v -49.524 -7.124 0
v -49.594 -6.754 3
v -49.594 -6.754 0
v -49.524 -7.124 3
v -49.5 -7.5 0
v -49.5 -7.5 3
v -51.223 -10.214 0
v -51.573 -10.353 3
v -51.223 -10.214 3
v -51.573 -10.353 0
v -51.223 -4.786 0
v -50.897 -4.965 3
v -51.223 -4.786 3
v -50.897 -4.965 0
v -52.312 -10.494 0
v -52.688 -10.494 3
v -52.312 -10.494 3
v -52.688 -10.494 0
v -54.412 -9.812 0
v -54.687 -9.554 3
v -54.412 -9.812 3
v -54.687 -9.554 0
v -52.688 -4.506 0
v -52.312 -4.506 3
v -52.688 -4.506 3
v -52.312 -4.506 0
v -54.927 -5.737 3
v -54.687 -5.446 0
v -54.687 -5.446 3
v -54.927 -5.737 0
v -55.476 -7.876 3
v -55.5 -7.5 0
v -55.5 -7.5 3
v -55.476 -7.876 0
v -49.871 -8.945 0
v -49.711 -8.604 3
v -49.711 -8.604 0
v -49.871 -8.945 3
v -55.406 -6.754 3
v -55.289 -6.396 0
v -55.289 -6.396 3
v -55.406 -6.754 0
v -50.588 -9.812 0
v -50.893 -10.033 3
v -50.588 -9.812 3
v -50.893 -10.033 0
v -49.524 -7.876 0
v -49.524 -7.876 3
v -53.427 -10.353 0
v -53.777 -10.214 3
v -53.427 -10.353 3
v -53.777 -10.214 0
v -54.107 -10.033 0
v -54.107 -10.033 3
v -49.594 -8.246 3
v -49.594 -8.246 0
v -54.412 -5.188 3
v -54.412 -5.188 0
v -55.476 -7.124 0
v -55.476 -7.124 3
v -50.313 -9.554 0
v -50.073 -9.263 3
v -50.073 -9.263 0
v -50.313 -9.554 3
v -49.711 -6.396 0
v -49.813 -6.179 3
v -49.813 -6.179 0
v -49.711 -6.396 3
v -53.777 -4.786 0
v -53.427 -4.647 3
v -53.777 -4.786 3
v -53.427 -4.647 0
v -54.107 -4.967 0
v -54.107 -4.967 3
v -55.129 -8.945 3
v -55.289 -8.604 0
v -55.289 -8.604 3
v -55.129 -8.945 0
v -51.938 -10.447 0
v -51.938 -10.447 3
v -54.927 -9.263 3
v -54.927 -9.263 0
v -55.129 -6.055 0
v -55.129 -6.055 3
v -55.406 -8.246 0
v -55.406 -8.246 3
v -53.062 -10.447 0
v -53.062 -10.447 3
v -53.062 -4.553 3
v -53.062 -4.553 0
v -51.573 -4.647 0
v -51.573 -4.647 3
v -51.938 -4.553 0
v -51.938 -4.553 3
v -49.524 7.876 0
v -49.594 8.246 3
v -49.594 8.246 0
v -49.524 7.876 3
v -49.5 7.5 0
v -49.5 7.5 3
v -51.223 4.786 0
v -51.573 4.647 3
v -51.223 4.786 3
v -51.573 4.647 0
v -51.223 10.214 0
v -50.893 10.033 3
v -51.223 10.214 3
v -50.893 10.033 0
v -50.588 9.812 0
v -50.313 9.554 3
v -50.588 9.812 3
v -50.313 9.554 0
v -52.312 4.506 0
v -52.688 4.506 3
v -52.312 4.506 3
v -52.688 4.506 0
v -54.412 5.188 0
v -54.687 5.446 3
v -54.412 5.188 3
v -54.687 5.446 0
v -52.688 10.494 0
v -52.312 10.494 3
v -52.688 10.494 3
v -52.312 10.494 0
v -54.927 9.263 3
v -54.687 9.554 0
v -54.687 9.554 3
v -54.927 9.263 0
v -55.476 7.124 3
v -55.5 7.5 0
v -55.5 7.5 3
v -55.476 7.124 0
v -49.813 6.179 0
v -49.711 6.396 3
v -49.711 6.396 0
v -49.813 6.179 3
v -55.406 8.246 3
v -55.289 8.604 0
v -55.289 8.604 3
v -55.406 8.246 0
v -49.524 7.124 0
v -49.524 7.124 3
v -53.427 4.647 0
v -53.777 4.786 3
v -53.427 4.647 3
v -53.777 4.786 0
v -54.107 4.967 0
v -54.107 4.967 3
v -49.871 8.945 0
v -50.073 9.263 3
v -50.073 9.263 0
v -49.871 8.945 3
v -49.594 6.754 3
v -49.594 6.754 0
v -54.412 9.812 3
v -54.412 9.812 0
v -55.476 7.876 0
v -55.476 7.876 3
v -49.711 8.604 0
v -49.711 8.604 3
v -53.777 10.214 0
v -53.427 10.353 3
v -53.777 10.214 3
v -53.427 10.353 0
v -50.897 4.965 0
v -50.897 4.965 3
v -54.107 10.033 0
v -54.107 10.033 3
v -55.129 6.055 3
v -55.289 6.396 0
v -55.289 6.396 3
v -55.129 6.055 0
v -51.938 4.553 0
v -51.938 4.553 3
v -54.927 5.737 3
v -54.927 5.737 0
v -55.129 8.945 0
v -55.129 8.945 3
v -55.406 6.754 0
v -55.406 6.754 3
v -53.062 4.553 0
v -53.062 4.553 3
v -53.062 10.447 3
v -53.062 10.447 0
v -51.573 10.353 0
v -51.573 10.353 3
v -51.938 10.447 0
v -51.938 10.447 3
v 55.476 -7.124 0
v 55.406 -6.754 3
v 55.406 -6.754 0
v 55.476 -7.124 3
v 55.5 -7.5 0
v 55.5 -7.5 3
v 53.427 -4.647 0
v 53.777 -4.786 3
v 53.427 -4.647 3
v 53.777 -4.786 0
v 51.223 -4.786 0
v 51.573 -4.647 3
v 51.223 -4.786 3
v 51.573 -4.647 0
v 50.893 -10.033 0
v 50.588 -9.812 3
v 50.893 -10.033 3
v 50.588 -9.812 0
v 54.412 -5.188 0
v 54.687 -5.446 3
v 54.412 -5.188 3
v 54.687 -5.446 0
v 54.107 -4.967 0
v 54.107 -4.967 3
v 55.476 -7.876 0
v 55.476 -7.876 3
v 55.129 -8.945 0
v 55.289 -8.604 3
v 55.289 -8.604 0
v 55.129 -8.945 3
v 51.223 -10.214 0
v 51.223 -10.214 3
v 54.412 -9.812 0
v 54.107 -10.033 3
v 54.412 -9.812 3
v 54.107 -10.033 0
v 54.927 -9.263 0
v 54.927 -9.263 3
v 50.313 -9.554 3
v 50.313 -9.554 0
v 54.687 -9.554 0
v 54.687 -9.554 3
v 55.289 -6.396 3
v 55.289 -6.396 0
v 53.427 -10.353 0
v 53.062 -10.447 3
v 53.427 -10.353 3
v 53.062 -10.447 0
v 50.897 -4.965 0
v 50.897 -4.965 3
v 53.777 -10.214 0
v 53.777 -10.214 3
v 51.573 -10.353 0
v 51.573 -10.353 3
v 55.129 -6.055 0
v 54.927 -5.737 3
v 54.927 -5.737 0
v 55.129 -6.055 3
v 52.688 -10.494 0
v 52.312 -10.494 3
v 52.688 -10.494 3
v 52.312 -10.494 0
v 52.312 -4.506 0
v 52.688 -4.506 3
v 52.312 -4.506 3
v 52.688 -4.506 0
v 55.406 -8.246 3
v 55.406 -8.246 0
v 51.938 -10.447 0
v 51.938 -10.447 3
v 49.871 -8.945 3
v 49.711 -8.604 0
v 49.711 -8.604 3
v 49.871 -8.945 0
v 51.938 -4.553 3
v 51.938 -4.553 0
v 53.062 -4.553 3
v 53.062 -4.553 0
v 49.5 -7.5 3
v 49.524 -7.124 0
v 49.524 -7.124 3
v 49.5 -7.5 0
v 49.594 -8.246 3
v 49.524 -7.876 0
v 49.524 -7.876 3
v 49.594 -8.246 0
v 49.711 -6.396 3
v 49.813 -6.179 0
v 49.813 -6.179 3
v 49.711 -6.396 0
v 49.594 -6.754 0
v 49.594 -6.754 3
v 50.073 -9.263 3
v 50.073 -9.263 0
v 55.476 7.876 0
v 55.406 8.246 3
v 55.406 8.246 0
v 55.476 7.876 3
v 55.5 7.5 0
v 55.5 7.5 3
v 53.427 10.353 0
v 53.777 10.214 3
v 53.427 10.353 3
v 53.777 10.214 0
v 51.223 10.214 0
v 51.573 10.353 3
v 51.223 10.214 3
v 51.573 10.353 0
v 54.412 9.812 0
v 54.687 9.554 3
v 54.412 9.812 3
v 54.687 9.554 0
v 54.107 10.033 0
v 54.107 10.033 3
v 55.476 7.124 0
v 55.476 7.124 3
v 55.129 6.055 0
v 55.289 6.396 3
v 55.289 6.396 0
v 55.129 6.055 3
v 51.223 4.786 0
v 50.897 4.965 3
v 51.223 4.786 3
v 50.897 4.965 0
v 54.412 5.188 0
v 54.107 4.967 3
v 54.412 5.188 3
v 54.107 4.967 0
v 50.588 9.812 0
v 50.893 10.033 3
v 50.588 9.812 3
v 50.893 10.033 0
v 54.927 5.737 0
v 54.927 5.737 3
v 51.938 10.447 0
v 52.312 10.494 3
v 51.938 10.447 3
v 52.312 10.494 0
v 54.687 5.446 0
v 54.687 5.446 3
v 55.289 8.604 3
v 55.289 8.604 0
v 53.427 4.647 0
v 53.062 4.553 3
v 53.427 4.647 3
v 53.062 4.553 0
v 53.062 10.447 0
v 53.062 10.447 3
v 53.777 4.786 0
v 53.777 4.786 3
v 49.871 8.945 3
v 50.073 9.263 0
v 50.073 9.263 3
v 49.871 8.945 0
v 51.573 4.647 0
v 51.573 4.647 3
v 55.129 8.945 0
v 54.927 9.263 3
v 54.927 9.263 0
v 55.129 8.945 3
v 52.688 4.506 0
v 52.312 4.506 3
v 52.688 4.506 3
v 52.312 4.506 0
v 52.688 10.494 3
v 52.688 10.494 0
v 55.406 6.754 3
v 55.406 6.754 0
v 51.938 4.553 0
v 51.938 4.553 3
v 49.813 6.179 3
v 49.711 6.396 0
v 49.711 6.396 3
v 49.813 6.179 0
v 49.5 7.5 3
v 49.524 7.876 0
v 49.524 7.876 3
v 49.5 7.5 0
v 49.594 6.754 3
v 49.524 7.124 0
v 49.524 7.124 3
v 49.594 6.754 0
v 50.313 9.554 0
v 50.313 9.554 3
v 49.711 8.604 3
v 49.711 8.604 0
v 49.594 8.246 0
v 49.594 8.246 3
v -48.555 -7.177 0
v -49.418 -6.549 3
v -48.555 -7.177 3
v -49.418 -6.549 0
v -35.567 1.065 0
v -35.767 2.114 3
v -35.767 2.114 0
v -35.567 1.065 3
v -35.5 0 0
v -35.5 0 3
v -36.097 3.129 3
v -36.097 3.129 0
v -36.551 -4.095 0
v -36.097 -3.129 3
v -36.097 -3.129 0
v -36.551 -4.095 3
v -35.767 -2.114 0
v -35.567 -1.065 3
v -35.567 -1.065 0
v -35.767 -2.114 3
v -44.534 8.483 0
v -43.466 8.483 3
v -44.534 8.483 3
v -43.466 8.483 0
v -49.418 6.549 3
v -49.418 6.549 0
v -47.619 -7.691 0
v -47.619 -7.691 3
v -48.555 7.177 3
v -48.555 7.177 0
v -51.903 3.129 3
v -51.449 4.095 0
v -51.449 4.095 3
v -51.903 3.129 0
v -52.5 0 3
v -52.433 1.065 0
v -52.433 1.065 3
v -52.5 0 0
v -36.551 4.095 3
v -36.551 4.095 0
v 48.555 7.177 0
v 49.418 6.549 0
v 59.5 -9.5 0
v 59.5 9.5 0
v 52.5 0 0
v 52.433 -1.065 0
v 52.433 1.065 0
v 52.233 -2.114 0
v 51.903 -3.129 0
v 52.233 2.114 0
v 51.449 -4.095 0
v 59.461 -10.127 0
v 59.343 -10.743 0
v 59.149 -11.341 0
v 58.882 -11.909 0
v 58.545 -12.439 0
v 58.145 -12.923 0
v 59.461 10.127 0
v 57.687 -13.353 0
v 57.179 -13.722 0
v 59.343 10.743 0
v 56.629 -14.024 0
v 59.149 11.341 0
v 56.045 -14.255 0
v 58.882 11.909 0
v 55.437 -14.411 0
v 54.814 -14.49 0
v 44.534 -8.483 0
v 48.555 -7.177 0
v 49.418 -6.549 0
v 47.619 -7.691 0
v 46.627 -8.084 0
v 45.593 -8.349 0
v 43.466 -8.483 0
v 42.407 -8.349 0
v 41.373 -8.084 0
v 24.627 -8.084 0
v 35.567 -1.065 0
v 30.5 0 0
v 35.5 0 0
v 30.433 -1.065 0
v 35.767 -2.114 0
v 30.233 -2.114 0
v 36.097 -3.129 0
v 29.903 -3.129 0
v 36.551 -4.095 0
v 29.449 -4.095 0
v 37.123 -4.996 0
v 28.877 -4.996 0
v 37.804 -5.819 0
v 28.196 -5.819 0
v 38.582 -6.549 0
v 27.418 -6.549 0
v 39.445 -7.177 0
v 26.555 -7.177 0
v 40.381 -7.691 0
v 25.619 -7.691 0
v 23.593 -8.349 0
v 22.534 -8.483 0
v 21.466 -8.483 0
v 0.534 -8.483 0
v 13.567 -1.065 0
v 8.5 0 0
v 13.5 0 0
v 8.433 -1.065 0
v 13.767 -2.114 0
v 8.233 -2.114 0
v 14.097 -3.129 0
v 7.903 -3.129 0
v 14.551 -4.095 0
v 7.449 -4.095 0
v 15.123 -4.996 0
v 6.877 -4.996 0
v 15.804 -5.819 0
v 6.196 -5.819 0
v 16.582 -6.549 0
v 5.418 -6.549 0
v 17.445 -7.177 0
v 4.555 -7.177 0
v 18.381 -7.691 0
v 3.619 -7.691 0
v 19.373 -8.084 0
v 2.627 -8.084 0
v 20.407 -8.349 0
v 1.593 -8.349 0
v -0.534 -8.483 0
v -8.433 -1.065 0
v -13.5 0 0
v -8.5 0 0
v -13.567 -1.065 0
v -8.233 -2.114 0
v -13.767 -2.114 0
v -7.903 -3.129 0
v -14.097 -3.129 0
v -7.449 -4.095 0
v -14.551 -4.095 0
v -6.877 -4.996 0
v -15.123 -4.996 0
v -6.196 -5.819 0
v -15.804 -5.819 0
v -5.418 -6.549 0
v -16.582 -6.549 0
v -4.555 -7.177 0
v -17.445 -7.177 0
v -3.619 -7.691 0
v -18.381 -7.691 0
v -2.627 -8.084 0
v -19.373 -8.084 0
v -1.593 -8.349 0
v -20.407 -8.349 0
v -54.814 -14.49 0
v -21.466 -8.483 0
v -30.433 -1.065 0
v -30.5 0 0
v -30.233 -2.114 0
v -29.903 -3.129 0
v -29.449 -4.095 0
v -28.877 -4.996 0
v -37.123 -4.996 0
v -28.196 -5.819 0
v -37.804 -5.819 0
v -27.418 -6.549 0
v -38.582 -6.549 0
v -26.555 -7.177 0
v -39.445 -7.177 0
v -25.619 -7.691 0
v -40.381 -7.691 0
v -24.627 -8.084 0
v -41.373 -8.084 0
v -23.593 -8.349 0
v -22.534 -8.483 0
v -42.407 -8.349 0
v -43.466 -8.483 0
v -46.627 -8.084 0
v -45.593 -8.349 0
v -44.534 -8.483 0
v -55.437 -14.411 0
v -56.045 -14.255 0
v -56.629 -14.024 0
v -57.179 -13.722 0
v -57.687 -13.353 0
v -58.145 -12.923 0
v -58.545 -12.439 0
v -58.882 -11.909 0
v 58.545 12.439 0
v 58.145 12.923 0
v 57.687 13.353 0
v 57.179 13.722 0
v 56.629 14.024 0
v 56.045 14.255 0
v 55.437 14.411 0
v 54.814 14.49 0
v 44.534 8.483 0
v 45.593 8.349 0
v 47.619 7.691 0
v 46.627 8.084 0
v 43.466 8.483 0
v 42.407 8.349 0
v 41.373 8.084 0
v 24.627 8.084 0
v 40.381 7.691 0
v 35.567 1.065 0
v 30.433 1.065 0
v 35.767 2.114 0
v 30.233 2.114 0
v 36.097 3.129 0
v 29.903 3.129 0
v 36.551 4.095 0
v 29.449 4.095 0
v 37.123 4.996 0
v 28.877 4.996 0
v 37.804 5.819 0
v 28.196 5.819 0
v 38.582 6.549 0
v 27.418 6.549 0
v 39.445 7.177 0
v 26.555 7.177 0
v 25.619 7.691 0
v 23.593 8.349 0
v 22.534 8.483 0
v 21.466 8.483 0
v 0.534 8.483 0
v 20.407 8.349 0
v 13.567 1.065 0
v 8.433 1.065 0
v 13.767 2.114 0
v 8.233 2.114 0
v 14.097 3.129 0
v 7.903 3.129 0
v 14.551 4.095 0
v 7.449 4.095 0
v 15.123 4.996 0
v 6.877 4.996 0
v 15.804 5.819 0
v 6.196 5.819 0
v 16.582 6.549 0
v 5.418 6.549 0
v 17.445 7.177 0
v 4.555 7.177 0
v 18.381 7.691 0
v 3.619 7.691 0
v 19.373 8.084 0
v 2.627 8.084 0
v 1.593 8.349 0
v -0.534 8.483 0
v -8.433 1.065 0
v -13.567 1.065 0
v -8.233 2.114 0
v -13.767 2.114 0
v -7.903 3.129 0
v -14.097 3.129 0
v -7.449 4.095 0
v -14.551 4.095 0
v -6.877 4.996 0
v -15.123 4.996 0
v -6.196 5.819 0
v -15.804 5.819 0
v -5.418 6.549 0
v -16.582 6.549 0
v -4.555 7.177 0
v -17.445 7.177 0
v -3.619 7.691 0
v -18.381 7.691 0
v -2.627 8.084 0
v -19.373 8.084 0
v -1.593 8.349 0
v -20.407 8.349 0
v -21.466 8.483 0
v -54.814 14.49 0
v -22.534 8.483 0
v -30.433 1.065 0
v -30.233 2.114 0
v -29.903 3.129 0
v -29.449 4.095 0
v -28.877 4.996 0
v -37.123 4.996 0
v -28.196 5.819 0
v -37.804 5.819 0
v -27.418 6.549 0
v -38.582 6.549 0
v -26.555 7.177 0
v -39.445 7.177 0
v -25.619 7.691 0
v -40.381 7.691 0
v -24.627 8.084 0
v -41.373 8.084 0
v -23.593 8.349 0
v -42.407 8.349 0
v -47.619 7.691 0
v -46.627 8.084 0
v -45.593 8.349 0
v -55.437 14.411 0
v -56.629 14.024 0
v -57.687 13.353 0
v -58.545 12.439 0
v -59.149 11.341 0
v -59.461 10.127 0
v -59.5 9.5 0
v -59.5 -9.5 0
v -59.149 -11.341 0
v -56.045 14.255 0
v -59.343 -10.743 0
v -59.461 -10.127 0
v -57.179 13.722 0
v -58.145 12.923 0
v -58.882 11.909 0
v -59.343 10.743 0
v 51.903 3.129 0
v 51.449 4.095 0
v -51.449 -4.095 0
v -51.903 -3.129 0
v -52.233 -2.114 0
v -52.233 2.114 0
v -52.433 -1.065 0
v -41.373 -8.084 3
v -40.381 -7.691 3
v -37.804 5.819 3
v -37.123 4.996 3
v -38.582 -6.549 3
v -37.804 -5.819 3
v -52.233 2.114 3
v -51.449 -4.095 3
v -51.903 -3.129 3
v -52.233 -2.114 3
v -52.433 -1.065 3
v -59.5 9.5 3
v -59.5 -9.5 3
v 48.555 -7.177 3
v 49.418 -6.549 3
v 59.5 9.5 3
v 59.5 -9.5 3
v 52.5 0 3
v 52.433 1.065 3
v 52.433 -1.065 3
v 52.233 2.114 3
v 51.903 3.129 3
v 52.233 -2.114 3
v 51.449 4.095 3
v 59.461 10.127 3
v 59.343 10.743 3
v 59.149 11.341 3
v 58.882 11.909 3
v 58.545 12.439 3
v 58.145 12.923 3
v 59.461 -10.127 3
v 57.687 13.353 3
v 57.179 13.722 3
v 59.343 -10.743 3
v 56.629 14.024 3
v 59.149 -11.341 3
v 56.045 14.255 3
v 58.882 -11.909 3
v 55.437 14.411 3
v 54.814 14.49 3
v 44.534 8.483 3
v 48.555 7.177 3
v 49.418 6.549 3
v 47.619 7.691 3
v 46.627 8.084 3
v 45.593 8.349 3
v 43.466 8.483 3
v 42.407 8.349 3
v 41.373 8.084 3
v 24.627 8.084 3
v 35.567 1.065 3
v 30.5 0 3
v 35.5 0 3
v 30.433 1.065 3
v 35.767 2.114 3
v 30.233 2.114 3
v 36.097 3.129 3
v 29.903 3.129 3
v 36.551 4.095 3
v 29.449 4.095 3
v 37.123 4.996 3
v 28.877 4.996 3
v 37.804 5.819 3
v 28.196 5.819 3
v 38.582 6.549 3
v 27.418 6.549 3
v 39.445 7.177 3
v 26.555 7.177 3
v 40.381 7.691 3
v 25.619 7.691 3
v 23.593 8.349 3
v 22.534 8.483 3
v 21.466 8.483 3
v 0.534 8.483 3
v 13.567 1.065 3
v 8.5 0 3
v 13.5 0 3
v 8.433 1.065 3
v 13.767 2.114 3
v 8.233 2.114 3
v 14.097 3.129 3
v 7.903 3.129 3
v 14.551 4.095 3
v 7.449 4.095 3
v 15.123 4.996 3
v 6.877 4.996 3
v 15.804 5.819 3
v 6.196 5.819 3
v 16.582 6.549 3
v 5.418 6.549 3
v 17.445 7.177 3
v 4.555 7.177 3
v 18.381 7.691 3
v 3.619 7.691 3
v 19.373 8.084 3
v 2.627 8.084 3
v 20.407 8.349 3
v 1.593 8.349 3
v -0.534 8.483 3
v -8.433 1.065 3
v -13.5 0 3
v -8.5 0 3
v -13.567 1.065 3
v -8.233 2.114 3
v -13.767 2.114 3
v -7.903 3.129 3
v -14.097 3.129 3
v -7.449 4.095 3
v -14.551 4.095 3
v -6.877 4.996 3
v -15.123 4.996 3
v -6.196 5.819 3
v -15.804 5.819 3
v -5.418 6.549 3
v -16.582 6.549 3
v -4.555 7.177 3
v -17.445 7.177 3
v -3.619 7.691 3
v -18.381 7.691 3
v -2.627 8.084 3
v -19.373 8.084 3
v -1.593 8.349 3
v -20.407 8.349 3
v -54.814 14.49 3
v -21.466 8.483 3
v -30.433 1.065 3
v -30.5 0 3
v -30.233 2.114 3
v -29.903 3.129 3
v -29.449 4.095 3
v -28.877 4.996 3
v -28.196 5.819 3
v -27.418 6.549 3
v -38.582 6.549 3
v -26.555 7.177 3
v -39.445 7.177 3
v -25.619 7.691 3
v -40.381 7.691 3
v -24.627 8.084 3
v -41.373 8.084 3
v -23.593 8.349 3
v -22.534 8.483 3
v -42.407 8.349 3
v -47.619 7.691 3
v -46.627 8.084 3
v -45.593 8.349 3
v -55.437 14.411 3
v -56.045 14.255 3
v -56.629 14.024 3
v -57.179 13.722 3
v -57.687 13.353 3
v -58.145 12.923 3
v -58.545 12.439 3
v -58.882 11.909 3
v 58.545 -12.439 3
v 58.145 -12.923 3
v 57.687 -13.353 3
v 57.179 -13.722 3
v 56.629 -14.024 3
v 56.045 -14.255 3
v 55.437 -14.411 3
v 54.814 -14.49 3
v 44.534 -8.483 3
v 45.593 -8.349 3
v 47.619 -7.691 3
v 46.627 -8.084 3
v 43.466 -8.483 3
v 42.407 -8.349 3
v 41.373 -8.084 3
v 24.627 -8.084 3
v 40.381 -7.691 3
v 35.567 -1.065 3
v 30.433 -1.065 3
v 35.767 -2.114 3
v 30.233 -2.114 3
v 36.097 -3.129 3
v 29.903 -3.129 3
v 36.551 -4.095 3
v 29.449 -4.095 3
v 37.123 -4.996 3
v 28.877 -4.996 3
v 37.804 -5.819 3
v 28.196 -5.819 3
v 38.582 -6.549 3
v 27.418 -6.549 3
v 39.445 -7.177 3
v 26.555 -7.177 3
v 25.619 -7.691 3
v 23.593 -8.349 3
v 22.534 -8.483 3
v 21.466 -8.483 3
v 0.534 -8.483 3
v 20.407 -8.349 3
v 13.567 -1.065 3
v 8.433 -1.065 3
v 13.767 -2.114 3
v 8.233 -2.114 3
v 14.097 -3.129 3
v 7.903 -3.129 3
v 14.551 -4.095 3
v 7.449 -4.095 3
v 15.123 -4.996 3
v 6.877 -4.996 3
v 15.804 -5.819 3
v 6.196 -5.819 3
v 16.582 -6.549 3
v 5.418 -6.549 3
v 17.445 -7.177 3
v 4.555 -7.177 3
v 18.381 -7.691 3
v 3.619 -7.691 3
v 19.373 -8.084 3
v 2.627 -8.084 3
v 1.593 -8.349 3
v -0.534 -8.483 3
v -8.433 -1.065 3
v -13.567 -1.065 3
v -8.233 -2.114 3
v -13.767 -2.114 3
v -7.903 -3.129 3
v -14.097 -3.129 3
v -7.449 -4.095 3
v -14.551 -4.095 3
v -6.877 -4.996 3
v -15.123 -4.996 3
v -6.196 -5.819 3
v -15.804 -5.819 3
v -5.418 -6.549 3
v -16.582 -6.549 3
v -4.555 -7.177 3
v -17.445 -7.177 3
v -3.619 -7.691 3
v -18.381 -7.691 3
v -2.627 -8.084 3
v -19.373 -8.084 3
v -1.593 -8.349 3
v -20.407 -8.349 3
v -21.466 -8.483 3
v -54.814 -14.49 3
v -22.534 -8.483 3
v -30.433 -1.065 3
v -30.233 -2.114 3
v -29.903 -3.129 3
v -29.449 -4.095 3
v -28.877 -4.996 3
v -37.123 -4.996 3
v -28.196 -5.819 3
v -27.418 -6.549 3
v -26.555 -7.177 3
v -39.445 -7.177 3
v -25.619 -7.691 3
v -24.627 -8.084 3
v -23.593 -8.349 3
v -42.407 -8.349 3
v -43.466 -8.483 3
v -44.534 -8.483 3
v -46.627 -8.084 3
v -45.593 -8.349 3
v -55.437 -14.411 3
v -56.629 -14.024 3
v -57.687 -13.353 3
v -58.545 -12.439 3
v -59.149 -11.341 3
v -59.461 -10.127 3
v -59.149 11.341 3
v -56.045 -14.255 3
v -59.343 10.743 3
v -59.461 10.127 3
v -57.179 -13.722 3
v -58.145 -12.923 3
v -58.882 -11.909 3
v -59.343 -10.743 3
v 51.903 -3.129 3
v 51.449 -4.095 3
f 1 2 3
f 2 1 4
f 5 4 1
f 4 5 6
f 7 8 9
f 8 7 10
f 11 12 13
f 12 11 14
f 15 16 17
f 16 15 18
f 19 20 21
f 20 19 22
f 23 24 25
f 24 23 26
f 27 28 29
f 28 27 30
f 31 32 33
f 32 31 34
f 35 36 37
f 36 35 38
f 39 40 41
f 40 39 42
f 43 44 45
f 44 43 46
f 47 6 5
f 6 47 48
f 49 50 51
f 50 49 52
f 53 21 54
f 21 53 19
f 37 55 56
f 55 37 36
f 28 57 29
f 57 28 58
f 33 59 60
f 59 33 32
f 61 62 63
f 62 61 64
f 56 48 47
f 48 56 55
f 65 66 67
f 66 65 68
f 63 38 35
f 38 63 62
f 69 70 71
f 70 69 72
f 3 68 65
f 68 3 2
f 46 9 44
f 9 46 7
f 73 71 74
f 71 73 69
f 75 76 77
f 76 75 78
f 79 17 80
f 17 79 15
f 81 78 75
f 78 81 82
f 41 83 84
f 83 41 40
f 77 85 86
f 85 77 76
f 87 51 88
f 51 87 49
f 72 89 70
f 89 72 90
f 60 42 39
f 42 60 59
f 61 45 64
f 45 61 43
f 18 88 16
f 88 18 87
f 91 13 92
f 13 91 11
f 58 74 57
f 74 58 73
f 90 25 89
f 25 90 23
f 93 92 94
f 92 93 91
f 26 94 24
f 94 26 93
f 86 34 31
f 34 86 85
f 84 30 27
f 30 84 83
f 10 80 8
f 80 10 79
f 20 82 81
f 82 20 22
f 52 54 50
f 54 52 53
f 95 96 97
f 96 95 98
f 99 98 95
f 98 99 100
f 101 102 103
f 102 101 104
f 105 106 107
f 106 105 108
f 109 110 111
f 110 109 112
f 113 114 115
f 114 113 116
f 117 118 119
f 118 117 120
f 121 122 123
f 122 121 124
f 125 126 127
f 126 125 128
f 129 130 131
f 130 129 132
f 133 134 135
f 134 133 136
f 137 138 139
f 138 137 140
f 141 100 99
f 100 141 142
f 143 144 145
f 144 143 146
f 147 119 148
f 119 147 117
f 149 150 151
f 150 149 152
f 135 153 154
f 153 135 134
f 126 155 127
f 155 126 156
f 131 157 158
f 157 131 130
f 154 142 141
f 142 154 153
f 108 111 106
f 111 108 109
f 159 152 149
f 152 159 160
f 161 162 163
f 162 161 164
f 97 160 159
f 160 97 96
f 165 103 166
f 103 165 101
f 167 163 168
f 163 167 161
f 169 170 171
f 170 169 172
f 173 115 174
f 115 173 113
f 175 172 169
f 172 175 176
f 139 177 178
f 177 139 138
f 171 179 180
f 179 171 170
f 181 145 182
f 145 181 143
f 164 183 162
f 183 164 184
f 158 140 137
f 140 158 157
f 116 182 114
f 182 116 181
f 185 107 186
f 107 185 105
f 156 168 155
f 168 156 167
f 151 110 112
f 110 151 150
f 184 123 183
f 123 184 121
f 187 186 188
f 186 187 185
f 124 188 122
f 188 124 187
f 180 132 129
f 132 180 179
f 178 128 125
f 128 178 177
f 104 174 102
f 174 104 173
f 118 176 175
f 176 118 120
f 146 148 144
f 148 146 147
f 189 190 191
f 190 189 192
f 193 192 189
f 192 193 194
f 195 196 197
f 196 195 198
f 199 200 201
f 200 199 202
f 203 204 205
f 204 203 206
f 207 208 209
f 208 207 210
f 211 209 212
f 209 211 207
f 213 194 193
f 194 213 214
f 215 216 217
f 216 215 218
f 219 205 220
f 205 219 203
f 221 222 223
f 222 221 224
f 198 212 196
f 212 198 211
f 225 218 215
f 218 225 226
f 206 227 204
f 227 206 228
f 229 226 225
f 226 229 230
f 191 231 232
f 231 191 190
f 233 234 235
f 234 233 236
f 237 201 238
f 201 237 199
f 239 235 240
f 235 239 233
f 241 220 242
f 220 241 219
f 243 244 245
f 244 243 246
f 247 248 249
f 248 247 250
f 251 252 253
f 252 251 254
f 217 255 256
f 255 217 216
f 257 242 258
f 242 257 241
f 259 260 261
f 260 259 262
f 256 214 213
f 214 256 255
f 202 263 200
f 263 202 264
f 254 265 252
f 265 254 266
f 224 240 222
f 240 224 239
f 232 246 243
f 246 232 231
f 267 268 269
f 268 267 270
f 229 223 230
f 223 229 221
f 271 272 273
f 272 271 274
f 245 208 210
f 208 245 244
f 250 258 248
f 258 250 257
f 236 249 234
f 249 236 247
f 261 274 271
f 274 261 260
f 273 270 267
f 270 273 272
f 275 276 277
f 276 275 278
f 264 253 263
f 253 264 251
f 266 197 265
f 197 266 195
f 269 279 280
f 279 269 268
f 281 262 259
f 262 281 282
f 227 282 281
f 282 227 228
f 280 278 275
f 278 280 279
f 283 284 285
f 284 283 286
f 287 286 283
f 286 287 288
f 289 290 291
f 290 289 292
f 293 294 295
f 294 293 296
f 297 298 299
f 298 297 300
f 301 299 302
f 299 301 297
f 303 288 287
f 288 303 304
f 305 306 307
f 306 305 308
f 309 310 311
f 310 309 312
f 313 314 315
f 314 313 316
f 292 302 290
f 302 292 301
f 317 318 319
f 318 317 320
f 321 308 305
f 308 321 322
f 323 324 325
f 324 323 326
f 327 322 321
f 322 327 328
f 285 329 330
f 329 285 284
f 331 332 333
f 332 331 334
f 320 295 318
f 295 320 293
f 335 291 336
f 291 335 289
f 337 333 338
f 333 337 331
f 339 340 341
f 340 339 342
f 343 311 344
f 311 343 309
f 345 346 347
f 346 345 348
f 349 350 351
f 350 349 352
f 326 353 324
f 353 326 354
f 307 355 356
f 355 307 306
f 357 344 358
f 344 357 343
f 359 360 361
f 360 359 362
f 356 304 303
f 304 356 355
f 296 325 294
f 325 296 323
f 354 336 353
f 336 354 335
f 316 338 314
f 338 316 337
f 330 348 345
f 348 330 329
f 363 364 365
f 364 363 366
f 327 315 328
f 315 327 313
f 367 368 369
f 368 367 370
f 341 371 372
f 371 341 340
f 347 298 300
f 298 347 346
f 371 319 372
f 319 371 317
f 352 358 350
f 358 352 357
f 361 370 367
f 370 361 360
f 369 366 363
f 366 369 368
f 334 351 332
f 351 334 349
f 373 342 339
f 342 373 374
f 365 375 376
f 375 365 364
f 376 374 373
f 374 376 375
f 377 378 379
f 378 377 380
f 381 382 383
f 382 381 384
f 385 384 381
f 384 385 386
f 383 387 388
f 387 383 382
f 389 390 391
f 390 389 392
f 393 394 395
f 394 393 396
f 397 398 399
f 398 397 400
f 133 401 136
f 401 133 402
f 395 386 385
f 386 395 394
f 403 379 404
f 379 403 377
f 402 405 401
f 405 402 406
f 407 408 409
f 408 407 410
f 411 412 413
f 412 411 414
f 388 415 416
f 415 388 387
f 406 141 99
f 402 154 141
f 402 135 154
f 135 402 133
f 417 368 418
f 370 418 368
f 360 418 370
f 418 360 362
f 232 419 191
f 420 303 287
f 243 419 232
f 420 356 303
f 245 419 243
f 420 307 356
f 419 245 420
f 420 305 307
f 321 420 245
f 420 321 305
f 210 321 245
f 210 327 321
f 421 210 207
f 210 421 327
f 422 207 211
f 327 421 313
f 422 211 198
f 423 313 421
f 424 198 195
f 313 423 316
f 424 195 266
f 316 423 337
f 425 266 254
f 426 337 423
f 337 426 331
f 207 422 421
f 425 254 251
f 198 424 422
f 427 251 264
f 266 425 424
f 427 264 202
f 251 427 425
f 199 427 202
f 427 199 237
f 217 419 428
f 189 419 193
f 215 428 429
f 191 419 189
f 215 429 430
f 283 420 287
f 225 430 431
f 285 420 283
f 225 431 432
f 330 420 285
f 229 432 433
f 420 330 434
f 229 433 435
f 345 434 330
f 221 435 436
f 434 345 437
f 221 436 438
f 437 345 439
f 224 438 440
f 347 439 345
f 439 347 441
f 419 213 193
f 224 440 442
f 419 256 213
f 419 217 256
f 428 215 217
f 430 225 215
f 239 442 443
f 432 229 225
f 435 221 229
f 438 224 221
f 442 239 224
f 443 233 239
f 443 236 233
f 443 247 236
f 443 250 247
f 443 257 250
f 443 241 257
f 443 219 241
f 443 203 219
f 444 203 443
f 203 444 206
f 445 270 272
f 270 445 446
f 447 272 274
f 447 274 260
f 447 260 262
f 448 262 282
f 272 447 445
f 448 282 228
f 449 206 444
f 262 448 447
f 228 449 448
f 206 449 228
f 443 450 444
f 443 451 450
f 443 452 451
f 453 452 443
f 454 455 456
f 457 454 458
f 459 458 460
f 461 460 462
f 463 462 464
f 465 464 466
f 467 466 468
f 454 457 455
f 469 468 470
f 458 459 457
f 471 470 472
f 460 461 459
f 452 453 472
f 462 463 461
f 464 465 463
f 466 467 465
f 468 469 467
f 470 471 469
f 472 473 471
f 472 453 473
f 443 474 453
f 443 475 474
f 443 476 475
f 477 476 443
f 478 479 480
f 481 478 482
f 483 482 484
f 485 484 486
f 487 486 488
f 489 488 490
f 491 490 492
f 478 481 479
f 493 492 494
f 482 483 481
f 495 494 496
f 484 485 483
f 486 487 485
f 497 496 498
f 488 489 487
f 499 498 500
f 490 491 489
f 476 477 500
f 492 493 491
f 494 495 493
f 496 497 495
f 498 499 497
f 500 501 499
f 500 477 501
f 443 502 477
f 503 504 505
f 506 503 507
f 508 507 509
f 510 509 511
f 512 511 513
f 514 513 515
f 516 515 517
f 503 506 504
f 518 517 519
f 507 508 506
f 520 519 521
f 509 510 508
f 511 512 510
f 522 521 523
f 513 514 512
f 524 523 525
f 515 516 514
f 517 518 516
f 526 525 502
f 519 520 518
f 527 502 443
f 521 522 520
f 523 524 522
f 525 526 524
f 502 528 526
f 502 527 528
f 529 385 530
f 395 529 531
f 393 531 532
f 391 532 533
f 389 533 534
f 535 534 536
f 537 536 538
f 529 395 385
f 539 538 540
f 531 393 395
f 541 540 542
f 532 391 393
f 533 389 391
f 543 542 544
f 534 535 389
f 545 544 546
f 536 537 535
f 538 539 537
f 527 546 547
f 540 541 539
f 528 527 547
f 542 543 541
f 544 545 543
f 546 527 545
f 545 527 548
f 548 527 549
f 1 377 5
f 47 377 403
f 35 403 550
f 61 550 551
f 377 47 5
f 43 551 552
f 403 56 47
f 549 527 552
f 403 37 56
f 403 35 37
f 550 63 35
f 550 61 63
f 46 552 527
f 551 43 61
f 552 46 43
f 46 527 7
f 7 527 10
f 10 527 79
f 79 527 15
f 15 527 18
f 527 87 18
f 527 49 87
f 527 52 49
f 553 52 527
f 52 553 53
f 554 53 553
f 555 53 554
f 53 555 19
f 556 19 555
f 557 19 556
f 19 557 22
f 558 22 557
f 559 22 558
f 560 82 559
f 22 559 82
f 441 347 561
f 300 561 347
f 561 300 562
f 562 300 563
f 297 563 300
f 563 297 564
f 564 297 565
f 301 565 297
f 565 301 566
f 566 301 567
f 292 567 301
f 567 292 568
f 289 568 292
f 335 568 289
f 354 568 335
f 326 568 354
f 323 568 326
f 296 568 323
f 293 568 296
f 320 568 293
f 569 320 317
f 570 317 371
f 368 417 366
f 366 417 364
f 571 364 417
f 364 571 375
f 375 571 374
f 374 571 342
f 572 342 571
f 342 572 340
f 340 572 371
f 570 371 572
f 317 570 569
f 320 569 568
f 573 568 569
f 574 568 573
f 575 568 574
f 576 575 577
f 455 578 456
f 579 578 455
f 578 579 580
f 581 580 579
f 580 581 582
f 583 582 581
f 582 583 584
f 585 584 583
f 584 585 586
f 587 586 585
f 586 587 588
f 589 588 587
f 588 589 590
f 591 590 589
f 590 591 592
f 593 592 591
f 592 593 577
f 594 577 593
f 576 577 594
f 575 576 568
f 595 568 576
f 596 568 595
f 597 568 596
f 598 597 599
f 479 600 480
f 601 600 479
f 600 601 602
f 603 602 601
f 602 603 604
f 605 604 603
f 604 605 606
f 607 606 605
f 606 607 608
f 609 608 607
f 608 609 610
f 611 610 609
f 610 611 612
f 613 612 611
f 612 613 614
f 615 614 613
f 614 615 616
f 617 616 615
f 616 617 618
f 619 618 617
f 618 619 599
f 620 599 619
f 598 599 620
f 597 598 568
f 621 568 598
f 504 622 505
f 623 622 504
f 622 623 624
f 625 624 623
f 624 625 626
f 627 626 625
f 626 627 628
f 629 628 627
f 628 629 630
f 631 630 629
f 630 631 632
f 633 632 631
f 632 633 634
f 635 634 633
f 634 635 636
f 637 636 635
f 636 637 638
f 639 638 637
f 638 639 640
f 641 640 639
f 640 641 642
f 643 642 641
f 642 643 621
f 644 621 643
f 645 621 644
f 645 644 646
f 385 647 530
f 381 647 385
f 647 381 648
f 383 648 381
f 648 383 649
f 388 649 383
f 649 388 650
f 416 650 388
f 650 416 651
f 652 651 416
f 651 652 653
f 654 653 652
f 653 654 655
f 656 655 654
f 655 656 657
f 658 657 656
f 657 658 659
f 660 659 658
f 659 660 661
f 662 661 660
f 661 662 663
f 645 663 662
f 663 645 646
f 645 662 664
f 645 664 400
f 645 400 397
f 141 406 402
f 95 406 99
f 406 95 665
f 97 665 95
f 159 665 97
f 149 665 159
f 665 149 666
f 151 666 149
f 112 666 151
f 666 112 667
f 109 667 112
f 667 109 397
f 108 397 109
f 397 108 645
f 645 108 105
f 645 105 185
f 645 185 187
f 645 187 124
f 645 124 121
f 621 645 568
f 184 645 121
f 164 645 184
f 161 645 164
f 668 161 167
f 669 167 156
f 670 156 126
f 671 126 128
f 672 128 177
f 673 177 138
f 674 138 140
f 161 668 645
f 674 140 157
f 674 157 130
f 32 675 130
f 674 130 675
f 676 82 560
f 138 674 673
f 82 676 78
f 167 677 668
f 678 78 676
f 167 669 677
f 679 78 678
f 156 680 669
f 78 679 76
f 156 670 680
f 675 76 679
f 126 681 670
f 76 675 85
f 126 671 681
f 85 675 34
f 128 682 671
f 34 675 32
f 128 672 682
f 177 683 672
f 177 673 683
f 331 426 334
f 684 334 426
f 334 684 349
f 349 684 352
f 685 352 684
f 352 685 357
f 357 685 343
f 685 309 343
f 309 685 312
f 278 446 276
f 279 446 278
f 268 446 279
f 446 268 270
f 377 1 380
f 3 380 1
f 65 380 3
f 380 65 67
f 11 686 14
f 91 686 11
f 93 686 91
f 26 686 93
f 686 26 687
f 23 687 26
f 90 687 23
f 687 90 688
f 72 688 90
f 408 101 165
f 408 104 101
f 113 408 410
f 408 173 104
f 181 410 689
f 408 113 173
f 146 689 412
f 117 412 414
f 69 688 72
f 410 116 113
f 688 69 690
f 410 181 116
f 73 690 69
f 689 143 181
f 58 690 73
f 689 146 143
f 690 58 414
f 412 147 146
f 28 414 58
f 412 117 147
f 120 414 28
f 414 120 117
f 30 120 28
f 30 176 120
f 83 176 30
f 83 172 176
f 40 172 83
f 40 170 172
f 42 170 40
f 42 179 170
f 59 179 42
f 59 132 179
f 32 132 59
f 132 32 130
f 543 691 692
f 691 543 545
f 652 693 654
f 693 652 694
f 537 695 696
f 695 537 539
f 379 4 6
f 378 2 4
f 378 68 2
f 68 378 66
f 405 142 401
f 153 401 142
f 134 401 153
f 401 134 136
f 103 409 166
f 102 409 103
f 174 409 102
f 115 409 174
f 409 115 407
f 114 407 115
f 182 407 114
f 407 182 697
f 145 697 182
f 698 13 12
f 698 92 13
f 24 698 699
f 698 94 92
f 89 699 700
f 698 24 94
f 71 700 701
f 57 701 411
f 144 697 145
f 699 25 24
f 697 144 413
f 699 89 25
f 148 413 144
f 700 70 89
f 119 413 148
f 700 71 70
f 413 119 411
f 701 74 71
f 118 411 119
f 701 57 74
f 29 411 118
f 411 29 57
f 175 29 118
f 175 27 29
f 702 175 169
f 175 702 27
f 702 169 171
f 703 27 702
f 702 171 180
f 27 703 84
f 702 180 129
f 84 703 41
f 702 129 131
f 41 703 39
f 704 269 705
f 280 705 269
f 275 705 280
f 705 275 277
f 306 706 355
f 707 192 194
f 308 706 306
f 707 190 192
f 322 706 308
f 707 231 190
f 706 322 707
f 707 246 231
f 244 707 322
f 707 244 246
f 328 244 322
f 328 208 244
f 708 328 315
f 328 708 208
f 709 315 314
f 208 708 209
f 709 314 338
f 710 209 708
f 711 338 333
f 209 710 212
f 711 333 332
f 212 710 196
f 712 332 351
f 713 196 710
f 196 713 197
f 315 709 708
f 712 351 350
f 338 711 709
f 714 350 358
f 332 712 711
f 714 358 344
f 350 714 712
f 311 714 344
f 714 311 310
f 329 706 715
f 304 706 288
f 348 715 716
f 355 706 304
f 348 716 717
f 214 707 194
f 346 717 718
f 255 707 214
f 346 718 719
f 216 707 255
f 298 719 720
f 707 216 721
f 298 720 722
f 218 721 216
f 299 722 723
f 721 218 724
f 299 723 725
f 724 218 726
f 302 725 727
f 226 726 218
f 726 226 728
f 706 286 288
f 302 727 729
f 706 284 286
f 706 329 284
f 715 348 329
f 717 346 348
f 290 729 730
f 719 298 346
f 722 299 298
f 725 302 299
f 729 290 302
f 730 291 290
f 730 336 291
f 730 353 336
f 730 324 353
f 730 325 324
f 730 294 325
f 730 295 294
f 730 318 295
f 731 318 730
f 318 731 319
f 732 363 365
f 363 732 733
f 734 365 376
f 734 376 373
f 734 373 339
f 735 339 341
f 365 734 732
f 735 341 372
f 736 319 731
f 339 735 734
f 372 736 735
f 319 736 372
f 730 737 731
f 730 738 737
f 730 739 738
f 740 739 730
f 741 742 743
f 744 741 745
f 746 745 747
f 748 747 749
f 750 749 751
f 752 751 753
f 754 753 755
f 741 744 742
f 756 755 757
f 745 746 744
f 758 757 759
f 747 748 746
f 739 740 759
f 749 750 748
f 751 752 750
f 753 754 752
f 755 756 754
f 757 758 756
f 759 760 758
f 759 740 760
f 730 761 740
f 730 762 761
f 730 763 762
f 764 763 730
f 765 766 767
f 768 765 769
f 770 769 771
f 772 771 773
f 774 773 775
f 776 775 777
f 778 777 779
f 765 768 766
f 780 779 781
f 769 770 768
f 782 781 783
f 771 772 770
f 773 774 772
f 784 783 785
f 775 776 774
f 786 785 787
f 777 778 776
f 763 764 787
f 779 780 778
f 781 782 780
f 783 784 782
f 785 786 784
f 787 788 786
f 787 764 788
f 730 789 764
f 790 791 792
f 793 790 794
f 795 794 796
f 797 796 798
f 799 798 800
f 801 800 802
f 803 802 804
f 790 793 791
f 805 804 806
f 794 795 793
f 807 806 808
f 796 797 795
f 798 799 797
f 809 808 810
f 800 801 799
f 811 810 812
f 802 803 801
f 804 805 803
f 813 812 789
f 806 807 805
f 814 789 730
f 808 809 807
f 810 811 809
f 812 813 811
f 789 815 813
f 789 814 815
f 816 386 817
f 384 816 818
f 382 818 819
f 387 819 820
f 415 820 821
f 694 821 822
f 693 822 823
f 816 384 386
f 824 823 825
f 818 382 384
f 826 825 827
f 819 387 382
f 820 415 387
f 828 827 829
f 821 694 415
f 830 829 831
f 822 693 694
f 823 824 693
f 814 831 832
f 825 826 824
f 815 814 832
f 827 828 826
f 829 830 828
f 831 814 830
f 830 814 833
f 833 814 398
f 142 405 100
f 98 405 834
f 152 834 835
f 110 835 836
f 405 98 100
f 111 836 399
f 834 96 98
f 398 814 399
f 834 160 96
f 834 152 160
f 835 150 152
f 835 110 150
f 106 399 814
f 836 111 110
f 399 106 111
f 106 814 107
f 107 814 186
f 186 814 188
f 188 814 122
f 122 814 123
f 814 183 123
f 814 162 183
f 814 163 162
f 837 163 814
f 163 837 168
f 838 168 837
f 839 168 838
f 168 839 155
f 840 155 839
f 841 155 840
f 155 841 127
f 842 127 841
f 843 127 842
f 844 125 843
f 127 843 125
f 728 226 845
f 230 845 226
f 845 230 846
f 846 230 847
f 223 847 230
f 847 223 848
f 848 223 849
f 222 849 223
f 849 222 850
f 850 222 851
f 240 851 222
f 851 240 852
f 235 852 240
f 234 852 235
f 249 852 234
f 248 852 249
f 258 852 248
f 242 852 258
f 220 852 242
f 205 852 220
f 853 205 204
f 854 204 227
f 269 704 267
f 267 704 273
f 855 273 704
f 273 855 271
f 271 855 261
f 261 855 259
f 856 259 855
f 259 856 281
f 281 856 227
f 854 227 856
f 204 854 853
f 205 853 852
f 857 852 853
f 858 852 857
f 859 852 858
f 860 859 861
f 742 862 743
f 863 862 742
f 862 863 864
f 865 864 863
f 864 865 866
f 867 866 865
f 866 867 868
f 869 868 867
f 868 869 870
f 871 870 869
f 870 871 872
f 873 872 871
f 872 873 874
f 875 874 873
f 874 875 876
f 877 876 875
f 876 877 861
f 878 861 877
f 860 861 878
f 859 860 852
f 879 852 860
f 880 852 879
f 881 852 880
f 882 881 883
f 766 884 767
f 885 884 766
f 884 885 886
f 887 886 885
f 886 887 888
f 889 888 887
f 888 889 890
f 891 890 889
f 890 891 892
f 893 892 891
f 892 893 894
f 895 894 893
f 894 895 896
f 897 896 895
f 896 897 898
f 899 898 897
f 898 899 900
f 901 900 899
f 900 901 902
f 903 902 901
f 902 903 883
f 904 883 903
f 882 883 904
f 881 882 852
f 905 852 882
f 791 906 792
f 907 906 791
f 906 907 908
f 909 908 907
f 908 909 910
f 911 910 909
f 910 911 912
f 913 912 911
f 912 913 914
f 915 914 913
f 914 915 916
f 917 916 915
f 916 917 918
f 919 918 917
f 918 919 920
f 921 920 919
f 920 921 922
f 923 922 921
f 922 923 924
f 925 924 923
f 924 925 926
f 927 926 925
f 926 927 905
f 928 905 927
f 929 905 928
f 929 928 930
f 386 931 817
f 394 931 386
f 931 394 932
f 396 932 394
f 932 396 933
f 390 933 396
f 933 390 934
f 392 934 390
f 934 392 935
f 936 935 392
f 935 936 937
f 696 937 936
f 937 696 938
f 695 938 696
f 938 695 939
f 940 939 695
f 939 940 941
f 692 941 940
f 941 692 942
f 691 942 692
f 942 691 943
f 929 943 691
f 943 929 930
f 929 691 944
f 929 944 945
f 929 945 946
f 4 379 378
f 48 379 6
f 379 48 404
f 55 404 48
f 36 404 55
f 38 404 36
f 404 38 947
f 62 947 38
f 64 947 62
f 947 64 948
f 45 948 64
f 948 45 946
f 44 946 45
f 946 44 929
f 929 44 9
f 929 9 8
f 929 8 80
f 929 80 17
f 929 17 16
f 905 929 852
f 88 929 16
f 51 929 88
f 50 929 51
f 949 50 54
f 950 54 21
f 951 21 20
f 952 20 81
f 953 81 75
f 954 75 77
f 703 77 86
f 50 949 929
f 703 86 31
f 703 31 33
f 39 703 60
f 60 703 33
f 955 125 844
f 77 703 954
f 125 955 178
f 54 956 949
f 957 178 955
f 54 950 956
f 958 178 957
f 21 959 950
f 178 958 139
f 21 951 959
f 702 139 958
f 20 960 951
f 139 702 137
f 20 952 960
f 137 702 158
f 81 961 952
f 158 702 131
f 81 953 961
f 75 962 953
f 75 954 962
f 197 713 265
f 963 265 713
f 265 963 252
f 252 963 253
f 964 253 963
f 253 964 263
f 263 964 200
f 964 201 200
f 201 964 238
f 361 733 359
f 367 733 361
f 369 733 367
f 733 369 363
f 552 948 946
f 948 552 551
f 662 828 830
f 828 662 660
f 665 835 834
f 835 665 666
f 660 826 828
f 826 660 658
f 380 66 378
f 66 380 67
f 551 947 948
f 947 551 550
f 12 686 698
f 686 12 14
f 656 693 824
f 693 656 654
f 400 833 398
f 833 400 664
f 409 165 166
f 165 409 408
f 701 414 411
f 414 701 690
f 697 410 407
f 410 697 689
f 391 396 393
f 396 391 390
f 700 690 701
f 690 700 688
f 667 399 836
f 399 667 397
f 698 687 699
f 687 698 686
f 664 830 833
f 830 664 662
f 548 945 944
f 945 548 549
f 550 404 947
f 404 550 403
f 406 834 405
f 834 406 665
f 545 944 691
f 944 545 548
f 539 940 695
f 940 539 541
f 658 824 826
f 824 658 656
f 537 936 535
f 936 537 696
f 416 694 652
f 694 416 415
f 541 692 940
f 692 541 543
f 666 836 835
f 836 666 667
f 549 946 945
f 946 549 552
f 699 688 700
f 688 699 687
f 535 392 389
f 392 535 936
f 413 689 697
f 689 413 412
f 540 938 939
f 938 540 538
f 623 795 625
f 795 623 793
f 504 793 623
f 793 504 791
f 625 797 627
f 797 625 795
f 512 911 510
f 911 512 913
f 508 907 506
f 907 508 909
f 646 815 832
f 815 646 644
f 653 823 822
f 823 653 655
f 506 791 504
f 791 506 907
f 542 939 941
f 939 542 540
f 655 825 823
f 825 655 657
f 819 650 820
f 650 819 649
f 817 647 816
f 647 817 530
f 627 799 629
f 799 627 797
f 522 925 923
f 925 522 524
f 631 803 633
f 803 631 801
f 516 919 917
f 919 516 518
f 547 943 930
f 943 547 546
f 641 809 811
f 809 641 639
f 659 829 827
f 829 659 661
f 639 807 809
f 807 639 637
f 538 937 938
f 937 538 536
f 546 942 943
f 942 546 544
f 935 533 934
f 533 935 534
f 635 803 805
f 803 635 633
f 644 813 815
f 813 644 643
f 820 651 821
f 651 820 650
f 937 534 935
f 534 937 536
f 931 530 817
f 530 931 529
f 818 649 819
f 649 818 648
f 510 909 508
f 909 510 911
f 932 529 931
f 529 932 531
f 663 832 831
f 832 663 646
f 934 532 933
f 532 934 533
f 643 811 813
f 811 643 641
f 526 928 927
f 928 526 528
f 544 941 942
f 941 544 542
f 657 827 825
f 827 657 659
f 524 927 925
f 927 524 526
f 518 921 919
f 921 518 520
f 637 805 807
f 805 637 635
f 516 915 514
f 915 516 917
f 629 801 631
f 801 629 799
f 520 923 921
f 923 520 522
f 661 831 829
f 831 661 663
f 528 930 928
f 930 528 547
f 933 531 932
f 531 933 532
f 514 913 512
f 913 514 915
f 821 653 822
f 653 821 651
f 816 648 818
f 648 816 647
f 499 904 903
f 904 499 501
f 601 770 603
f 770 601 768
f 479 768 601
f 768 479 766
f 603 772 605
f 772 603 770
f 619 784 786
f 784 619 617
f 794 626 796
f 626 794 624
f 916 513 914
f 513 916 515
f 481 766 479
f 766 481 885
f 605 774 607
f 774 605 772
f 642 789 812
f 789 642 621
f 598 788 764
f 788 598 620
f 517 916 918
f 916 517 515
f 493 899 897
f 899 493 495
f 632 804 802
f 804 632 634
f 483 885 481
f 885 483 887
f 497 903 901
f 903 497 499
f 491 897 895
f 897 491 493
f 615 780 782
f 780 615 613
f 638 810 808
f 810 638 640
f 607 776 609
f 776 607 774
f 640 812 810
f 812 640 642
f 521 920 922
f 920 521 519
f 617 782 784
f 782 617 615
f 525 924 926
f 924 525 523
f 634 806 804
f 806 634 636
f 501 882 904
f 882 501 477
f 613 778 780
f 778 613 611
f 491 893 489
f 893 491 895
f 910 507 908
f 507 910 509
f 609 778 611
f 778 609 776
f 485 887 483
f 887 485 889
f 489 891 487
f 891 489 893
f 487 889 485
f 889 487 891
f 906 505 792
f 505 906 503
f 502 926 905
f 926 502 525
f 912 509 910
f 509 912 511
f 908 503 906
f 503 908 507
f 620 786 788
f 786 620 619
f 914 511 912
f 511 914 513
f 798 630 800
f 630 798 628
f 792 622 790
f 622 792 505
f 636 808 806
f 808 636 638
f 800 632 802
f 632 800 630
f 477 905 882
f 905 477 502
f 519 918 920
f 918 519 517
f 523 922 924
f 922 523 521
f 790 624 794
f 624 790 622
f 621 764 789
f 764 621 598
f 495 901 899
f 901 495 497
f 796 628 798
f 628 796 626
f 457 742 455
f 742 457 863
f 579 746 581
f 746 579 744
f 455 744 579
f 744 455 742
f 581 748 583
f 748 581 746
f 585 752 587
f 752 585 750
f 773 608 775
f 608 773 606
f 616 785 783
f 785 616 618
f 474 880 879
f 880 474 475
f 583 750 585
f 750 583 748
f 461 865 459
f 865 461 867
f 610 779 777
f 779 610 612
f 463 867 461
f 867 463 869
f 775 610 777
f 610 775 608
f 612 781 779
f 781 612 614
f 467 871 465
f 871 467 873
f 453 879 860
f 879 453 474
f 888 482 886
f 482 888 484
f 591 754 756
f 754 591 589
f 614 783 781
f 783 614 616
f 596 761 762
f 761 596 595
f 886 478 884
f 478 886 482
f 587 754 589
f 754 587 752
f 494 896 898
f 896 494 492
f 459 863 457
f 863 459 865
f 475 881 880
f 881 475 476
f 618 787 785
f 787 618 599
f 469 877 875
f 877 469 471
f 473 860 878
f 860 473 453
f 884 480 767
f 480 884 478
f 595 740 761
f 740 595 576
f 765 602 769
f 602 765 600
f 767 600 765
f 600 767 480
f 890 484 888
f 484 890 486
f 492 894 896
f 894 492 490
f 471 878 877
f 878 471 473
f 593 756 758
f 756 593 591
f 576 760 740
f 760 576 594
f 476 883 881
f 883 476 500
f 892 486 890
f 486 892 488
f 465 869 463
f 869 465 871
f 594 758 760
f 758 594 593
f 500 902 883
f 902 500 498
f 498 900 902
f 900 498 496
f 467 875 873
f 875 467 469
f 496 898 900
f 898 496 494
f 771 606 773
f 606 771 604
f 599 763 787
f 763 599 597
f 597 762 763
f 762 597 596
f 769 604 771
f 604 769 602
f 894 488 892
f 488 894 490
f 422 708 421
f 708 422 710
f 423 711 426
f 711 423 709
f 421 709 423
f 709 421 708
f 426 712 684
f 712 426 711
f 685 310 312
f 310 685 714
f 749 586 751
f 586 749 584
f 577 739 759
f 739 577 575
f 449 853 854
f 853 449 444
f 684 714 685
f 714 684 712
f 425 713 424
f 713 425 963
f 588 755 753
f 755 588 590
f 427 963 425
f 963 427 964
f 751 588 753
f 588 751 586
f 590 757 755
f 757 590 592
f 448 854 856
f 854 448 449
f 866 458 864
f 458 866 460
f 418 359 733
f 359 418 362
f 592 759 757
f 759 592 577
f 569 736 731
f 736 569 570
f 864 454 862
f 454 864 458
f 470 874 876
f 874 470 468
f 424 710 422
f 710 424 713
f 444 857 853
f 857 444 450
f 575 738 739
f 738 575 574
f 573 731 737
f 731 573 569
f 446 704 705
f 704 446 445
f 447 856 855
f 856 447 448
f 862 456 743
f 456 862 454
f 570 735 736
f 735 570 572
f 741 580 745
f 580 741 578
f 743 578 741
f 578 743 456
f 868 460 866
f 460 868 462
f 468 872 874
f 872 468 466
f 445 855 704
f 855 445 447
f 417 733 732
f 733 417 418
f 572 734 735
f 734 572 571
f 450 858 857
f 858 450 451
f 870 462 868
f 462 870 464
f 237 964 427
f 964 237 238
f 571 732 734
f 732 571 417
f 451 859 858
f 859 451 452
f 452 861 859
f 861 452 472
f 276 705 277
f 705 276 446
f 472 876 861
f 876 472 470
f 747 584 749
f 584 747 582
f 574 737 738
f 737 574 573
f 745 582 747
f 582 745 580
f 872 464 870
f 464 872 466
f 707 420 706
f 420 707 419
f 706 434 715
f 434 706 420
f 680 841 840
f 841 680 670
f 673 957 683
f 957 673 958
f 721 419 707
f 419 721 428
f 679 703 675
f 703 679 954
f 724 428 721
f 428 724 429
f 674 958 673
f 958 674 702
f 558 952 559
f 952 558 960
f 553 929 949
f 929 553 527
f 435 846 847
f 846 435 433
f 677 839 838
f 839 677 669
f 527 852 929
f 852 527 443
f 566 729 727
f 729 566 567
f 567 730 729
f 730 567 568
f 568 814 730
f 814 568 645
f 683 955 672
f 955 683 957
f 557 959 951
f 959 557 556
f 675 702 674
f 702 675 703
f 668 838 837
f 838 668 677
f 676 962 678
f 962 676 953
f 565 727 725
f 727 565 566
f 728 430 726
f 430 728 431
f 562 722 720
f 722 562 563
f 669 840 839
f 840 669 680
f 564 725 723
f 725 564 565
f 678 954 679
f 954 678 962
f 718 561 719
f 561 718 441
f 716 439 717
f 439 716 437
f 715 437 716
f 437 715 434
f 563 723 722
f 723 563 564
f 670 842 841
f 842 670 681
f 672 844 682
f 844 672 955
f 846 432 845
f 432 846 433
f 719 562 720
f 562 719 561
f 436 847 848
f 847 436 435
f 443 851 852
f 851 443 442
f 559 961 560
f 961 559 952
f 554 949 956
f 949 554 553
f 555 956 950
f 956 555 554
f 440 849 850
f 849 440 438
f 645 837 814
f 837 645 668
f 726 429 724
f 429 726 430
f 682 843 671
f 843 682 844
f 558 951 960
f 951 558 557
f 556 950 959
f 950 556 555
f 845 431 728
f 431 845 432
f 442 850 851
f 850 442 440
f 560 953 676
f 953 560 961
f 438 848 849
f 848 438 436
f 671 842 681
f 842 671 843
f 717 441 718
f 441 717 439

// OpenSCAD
$fn = 50;


difference() {
	union() {
		hull() {
			translate(v = [-54.5000000000, 9.5000000000, 0]) {
				cylinder(h = 3, r = 5);
			}
			translate(v = [54.5000000000, 9.5000000000, 0]) {
				cylinder(h = 3, r = 5);
			}
			translate(v = [-54.5000000000, -9.5000000000, 0]) {
				cylinder(h = 3, r = 5);
			}
			translate(v = [54.5000000000, -9.5000000000, 0]) {
				cylinder(h = 3, r = 5);
			}
		}
	}
	union() {
		#translate(v = [-52.5000000000, -7.5000000000, -100.0000000000]) {
			cylinder(h = 200, r = 3.0000000000);
		}
		#translate(v = [-52.5000000000, 7.5000000000, -100.0000000000]) {
			cylinder(h = 200, r = 3.0000000000);
		}
		#translate(v = [52.5000000000, -7.5000000000, -100.0000000000]) {
			cylinder(h = 200, r = 3.0000000000);
		}
		#translate(v = [52.5000000000, 7.5000000000, -100.0000000000]) {
			cylinder(h = 200, r = 3.0000000000);
		}
		#translate(v = [-44.0000000000, 0, 0]) {
			cylinder(h = 3, r = 8.5000000000);
		}
		#translate(v = [-22.0000000000, 0, 0]) {
			cylinder(h = 3, r = 8.5000000000);
		}
		#cylinder(h = 3, r = 8.5000000000);
		#translate(v = [22.0000000000, 0, 0]) {
			cylinder(h = 3, r = 8.5000000000);
		}
		#translate(v = [44.0000000000, 0, 0]) {
			cylinder(h = 3, r = 8.5000000000);
		}
	}
}
